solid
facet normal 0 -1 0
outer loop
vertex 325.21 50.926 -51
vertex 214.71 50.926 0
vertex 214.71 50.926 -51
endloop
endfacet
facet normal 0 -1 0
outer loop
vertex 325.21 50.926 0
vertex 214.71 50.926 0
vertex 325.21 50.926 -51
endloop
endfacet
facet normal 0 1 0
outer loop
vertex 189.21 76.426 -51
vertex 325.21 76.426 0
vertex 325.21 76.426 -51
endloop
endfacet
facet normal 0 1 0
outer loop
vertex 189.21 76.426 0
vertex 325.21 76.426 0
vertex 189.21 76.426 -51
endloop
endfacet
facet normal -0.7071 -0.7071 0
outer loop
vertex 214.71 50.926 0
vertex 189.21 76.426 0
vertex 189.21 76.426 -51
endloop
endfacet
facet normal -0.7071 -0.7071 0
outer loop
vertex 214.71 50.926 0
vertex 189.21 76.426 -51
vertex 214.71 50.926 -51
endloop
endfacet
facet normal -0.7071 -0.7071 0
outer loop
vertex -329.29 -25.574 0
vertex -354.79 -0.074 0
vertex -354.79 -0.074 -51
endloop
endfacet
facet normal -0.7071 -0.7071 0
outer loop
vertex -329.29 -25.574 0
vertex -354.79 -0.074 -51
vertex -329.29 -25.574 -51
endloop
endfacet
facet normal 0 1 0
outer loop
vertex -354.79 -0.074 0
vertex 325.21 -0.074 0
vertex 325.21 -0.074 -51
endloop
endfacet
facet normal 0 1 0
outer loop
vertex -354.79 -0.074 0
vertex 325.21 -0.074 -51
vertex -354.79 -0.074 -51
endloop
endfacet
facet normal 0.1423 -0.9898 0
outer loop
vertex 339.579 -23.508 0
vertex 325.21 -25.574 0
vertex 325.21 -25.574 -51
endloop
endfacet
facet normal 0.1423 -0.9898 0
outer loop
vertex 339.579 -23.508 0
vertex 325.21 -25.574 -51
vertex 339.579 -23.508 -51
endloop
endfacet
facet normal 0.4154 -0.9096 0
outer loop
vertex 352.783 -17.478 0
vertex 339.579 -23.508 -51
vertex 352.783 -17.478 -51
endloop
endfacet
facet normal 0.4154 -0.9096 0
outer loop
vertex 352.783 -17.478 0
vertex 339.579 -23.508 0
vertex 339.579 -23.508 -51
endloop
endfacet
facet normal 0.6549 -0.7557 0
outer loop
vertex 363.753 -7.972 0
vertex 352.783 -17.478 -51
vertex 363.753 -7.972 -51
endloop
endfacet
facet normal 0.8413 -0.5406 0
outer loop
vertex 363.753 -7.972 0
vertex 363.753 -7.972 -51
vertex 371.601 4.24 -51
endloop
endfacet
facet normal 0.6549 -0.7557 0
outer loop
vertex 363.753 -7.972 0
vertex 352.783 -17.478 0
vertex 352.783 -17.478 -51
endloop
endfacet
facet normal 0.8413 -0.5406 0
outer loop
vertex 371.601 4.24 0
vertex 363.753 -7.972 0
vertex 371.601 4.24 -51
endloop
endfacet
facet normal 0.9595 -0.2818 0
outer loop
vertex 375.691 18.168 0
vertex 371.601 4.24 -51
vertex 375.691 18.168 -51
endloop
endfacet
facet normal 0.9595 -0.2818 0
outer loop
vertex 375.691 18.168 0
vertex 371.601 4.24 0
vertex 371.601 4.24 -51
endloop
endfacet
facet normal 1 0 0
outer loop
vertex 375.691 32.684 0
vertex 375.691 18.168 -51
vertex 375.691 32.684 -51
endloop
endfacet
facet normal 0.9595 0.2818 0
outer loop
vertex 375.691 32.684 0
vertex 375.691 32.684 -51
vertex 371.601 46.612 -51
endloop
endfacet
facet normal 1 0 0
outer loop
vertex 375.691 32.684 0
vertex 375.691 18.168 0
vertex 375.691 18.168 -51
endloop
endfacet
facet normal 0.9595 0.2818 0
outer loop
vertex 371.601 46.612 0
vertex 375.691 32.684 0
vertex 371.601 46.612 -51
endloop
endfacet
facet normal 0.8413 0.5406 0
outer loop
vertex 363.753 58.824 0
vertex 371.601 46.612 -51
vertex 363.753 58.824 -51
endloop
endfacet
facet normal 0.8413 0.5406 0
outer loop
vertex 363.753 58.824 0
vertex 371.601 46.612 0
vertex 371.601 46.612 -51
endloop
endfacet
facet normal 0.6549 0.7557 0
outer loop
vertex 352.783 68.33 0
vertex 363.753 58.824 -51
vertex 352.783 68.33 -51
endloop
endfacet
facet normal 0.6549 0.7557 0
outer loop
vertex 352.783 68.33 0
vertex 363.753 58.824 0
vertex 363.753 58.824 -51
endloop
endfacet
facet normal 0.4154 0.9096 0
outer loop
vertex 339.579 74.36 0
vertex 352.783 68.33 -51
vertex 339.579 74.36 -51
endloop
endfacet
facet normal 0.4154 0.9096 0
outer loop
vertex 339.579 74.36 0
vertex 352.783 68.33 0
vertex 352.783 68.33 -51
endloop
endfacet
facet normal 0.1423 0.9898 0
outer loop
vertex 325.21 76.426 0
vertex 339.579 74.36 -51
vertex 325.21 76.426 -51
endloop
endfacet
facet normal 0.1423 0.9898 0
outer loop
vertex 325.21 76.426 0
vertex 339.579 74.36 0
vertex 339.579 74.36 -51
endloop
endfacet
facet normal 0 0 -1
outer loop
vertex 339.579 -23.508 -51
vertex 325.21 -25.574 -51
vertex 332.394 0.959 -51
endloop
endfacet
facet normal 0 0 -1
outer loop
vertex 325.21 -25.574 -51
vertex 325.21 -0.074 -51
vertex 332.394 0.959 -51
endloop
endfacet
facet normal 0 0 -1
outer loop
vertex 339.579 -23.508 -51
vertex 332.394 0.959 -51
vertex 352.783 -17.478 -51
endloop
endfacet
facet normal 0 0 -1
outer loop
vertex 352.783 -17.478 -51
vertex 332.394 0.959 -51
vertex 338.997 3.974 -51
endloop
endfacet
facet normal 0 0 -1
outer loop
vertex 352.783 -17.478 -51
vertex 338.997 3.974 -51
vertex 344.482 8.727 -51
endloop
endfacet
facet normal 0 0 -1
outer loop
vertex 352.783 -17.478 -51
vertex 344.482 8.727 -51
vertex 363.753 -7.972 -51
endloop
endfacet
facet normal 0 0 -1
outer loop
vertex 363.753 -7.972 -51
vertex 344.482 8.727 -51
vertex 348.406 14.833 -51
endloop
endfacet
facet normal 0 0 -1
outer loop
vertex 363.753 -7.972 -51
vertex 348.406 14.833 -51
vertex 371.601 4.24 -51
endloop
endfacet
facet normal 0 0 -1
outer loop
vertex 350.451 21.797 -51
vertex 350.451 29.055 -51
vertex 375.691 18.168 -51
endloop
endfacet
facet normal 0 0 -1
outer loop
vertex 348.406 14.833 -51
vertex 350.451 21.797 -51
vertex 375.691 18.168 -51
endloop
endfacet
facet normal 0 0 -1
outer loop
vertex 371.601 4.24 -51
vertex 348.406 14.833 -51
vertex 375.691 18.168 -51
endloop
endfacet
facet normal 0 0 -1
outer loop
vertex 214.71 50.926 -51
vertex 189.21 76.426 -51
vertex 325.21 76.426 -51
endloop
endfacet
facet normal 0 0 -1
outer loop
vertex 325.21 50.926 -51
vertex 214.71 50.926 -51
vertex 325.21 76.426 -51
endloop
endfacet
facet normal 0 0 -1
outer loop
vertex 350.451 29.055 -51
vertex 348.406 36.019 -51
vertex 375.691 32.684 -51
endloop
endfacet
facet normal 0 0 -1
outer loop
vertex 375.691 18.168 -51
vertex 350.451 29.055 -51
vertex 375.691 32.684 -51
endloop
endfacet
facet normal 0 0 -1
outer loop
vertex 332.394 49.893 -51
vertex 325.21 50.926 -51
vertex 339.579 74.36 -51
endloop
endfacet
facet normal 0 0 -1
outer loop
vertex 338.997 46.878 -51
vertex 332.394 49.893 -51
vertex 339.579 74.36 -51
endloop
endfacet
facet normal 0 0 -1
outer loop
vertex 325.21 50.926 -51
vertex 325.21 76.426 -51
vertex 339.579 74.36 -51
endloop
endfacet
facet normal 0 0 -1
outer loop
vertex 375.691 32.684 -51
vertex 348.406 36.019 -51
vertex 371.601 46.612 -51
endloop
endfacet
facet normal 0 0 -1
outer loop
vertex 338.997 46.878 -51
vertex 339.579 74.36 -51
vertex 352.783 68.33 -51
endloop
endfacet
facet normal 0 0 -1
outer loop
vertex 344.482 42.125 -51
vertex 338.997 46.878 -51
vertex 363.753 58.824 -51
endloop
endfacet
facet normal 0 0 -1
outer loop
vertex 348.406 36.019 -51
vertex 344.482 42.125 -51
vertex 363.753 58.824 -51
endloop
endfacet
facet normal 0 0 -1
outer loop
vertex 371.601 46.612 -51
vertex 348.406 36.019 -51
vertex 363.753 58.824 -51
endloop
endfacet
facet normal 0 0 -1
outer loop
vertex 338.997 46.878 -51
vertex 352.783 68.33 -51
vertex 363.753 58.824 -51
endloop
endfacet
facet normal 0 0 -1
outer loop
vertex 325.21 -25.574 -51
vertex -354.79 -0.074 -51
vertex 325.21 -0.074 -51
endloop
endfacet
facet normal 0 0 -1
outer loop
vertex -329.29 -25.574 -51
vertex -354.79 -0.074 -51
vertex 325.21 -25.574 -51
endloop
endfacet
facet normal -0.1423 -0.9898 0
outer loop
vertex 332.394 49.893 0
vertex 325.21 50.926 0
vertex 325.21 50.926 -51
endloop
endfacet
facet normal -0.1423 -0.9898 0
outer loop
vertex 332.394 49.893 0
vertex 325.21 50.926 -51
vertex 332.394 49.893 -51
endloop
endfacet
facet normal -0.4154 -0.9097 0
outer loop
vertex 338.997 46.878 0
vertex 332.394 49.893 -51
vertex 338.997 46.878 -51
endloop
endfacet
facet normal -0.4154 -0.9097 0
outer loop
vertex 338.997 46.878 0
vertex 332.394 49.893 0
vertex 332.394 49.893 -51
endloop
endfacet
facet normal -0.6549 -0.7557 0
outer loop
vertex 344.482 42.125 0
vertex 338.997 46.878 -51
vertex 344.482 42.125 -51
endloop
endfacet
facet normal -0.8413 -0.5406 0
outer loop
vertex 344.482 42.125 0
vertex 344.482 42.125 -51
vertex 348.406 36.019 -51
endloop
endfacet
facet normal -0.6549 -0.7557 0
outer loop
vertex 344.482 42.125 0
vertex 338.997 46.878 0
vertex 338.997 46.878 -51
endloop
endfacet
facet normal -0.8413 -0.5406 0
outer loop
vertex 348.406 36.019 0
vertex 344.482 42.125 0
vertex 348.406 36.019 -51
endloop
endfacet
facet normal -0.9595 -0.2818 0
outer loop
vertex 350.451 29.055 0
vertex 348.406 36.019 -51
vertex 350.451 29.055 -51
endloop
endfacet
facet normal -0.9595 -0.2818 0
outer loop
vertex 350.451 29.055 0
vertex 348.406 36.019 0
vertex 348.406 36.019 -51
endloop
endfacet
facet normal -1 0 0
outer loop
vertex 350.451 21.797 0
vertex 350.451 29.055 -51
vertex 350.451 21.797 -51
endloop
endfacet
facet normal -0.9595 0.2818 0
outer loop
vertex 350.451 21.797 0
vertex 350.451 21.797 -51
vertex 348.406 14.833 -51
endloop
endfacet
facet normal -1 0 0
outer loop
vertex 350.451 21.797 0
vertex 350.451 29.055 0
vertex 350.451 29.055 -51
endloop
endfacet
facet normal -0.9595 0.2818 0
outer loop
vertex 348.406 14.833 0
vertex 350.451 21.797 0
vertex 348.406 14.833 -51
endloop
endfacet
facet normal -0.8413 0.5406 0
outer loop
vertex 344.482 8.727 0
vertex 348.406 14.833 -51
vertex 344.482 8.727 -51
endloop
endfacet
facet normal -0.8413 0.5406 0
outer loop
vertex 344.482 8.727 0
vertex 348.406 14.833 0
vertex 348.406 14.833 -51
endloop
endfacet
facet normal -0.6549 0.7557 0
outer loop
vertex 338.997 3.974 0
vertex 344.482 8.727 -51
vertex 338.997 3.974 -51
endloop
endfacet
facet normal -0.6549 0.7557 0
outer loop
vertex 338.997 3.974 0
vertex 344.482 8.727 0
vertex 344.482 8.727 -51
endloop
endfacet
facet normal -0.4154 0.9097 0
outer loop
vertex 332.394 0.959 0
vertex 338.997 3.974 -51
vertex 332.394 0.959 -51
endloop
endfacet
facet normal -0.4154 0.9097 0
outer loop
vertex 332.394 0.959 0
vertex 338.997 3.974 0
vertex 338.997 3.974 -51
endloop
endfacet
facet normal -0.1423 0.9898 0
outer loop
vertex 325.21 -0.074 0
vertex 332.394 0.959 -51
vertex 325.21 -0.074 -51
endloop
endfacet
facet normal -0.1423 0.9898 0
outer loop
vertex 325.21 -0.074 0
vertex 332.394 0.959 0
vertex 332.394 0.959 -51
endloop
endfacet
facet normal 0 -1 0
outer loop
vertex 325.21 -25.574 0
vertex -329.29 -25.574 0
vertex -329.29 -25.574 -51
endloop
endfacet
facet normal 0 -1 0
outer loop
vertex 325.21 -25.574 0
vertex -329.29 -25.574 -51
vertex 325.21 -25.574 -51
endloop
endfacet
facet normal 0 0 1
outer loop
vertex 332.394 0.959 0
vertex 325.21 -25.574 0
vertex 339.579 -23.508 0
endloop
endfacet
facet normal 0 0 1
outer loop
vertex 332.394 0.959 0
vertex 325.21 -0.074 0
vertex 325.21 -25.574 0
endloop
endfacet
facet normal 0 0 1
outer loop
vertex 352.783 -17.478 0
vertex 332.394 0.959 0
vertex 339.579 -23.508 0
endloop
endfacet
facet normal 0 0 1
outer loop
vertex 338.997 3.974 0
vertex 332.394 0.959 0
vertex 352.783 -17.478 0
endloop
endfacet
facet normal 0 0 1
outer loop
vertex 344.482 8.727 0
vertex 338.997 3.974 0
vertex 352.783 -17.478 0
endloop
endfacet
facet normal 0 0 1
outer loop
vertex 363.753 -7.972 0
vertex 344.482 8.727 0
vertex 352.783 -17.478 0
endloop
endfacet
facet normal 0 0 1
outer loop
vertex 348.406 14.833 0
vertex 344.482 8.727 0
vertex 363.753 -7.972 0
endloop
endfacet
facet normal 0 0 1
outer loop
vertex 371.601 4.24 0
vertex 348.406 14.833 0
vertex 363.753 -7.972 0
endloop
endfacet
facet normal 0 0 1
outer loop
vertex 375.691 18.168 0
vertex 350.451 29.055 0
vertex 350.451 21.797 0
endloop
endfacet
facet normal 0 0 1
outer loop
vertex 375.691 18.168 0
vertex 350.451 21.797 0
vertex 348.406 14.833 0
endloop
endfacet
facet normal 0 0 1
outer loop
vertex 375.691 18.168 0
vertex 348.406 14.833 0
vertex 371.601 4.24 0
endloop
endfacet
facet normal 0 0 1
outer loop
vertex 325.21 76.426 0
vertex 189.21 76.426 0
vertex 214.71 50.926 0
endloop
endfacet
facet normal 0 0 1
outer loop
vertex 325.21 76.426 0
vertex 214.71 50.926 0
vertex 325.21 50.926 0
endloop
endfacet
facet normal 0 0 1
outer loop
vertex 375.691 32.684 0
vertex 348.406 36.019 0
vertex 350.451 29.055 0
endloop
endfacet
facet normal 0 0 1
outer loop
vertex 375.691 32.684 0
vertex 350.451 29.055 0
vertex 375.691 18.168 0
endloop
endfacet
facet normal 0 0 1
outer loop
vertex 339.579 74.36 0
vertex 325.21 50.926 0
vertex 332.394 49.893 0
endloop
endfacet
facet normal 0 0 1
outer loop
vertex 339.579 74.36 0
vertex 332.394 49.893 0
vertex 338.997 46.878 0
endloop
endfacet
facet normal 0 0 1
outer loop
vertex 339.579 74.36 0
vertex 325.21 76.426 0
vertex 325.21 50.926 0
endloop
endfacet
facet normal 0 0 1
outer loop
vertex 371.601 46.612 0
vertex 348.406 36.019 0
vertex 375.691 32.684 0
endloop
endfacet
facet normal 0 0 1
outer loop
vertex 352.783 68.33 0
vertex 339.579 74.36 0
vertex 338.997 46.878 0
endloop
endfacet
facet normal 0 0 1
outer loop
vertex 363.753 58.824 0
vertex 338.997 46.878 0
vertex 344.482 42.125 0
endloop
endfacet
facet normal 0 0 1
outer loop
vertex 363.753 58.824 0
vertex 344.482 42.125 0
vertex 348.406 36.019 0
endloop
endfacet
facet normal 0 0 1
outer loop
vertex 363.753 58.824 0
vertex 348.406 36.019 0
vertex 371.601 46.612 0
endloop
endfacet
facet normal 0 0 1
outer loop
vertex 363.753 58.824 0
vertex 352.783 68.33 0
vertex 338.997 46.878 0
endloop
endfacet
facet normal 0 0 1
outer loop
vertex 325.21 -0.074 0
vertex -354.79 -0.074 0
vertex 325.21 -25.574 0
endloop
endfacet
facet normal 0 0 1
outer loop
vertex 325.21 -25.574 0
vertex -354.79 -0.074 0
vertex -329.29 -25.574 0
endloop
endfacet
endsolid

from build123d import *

# Parameters (mm, degrees)
EXTRUDE_1_DEPTH = 30
SCALE_1_SCALE   = 1.7


with BuildPart() as part:
    # 草图1 → 凸台-拉伸1 (new body)
    with BuildSketch(Plane.XY):
        with BuildLine():
            Line((111.300105962, 44.956400142), (126.300105962, 29.956400142))
            Line((126.300105962, 29.956400142), (191.300105962, 29.956400142))
            ThreePointArc((191.300105962, 29.956400142), (206.300105962, 14.956400142), (191.300105962, -0.043599858))
            Line((191.300105962, -0.043599858), (-208.699894038, -0.043599858))
            Line((-208.699894038, -0.043599858), (-193.699894038, -15.043599858))
            Line((-193.699894038, -15.043599858), (191.300105962, -15.043599858))
            ThreePointArc((191.300105962, -15.043599858), (221.300105962, 14.956400142), (191.300105962, 44.956400142))
            Line((191.300105962, 44.956400142), (111.300105962, 44.956400142))
        make_face()
    extrude(amount=-EXTRUDE_1_DEPTH)


with BuildPart() as part_1:
    # 缩放比例1: scaled about (0, 0, 0)
    add(part.part.scale(SCALE_1_SCALE))


solid = part_1.part
